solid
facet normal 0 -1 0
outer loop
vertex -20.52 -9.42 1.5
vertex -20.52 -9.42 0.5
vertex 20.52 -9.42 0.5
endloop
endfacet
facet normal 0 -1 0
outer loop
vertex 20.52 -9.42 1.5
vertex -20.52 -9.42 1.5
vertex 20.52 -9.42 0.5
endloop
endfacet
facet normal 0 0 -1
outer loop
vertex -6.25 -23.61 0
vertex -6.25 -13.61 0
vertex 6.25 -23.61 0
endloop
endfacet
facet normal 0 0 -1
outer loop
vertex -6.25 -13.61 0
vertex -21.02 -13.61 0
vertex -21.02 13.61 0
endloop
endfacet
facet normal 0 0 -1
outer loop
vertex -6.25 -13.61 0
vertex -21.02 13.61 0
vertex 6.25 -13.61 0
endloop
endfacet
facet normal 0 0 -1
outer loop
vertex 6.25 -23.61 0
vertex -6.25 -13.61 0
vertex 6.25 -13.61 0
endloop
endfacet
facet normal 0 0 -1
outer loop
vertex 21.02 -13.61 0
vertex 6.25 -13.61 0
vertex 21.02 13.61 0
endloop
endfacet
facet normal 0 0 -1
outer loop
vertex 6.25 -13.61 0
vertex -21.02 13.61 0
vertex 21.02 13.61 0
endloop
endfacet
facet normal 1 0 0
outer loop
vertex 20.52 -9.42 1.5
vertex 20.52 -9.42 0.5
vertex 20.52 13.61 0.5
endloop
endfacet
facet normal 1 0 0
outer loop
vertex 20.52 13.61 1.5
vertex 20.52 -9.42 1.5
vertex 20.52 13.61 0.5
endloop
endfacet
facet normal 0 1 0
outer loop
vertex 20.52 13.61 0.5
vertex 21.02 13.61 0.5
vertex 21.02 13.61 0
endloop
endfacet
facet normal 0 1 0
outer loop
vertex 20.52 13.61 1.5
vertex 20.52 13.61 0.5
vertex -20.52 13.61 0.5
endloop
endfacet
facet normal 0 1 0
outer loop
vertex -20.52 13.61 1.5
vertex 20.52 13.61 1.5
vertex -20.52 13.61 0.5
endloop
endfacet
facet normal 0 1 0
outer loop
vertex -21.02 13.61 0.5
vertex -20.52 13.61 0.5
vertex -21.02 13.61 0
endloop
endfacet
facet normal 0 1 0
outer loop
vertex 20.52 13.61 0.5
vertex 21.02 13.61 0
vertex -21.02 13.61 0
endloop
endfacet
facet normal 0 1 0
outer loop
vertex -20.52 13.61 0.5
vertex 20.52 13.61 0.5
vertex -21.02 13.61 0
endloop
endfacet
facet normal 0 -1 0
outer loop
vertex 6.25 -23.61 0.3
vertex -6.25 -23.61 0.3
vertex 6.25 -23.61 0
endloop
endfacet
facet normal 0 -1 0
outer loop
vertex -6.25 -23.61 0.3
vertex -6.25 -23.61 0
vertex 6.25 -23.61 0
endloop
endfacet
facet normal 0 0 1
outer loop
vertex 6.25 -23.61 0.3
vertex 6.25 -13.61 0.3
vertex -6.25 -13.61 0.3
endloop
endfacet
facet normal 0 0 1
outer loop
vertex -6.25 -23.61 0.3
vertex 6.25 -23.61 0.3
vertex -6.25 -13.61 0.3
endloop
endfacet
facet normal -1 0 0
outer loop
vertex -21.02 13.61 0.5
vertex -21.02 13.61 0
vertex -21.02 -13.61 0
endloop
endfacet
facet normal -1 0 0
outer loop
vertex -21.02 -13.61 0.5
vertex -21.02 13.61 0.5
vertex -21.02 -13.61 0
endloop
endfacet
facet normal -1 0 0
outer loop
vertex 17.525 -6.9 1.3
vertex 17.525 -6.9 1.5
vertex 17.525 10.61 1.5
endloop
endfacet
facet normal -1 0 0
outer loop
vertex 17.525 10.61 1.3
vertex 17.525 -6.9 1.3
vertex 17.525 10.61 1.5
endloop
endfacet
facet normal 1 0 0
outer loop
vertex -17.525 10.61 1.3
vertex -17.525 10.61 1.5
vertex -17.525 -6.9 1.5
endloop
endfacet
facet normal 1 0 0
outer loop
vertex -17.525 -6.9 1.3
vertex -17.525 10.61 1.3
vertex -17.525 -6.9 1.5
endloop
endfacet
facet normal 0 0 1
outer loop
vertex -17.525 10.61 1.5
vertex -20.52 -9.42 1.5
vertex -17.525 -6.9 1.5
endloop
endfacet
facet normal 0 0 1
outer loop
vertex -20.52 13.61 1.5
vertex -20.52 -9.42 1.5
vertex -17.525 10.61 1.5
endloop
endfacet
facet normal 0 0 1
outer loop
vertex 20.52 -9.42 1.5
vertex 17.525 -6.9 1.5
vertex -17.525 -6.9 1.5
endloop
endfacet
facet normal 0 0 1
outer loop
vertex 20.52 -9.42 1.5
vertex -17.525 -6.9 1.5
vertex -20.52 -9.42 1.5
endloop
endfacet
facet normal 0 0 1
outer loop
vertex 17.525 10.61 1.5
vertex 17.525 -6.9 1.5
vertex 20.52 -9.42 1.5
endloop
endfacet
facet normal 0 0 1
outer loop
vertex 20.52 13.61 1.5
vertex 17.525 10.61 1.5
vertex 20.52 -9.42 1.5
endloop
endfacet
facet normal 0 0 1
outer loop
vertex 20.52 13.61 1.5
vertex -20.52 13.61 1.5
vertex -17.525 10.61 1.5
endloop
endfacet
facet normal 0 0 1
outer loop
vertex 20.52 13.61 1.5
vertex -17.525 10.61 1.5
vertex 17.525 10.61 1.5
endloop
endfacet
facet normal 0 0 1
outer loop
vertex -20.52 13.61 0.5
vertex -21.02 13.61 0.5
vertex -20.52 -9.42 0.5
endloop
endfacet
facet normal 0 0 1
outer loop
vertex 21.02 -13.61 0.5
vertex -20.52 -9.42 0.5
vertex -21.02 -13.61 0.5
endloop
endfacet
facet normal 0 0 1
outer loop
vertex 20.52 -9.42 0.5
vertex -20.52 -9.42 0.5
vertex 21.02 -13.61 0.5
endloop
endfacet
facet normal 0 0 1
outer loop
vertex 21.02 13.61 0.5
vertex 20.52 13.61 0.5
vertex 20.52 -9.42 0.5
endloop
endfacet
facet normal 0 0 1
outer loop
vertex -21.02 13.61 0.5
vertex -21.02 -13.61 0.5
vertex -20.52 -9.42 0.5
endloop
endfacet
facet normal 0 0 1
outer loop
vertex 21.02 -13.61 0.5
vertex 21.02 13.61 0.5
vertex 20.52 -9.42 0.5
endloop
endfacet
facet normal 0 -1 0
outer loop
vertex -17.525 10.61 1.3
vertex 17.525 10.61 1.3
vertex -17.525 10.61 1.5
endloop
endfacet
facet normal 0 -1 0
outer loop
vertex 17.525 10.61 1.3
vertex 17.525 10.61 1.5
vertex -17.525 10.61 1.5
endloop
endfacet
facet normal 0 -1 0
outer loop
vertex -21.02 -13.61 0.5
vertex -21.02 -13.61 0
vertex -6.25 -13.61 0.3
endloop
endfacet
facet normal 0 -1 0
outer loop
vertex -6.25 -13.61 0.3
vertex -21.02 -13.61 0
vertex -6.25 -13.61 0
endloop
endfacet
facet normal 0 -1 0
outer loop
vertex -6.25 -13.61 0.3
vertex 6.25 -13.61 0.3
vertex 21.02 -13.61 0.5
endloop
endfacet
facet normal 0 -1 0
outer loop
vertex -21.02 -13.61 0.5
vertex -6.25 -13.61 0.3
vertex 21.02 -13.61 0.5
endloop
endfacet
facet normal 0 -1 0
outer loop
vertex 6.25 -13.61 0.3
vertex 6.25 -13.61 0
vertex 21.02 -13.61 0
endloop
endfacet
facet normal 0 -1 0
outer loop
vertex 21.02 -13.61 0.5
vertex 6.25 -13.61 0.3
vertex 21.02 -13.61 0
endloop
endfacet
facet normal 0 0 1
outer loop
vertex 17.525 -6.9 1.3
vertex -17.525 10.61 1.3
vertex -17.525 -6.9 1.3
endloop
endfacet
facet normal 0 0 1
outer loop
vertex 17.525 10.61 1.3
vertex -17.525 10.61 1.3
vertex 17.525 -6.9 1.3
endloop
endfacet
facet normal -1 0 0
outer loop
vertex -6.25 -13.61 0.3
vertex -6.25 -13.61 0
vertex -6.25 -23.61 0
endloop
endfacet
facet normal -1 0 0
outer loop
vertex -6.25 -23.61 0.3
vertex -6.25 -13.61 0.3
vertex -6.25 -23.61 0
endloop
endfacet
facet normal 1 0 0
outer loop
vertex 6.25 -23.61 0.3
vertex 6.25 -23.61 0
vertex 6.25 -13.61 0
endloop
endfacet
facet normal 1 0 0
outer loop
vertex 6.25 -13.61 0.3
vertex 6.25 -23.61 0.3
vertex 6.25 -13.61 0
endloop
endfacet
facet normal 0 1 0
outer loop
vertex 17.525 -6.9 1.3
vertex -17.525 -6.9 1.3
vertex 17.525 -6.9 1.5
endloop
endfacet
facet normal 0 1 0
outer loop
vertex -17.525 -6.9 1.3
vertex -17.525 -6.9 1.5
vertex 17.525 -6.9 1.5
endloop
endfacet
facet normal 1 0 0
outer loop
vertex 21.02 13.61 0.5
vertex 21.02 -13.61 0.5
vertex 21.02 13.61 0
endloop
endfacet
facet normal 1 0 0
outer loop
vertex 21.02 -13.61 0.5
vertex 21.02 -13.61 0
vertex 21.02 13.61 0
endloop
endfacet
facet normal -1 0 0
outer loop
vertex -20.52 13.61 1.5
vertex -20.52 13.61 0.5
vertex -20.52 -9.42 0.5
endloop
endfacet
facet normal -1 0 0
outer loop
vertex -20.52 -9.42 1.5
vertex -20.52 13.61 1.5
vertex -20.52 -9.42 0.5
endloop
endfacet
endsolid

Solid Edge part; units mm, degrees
sketch "Sketch1" plane through (0, 0, 0) normal (0, 0, 1) x (1, 0, 0)
  line L0 (-21.02, -13.61) -> (21.02, -13.61)
  line L1 (21.02, -13.61) -> (21.02, 13.61)
  line L2 (21.02, 13.61) -> (-21.02, 13.61)
  line L3 (-21.02, 13.61) -> (-21.02, -13.61)
  dimension "D1" = 42.04
  dimension "D2" = 27.22
extrude "Protrusion1" add sketch "Sketch1" along normal blind 0.5
sketch "Sketch2" plane through (0, 0, 0.5) normal (0, 0, 1) x (1, 0, 0)
  line L0 (-20.52, -9.42) -> (20.52, -9.42)
  line L1 (20.52, -9.42) -> (20.52, 13.61)
  line L2 (20.52, 13.61) -> (-20.52, 13.61)
  line L3 (-20.52, 13.61) -> (-20.52, -9.42)
  dimension "D1" = 41.04
  dimension "D2" = 23.03
  dimension "D3" = 4.19
extrude "Ausprägung_2" add sketch "Sketch2" along normal blind 1
sketch "Sketch3" plane through (0, 2.095, 1.5) normal (0, 0, 1) x (1, 0, 0)
  line L0 (-17.525, -8.995) -> (17.525, -8.995)
  line L1 (17.525, -8.995) -> (17.525, 8.515)
  line L2 (17.525, 8.515) -> (-17.525, 8.515)
  line L3 (-17.525, 8.515) -> (-17.525, -8.995)
  dimension "D1" = 35.05
  dimension "D2" = 17.51
  dimension "D3" = 3
extrude "Ausschnitt_1" cut sketch "Sketch3" against normal blind 0.2
sketch "Sketch4" plane through (0, 0, 0) normal (0, 0, 1) x (1, 0, 0)
  line L0 (-6.25, -13.61) -> (6.25, -13.61)
  line L1 (6.25, -23.61) -> (6.25, -13.61)
  line L2 (-6.25, -23.61) -> (6.25, -23.61)
  line L3 (-6.25, -13.61) -> (-6.25, -23.61)
  dimension "D1" = 12.5
  dimension "D2" = 10
extrude "Ausprägung_3" add sketch "Sketch4" along normal blind 0.3
